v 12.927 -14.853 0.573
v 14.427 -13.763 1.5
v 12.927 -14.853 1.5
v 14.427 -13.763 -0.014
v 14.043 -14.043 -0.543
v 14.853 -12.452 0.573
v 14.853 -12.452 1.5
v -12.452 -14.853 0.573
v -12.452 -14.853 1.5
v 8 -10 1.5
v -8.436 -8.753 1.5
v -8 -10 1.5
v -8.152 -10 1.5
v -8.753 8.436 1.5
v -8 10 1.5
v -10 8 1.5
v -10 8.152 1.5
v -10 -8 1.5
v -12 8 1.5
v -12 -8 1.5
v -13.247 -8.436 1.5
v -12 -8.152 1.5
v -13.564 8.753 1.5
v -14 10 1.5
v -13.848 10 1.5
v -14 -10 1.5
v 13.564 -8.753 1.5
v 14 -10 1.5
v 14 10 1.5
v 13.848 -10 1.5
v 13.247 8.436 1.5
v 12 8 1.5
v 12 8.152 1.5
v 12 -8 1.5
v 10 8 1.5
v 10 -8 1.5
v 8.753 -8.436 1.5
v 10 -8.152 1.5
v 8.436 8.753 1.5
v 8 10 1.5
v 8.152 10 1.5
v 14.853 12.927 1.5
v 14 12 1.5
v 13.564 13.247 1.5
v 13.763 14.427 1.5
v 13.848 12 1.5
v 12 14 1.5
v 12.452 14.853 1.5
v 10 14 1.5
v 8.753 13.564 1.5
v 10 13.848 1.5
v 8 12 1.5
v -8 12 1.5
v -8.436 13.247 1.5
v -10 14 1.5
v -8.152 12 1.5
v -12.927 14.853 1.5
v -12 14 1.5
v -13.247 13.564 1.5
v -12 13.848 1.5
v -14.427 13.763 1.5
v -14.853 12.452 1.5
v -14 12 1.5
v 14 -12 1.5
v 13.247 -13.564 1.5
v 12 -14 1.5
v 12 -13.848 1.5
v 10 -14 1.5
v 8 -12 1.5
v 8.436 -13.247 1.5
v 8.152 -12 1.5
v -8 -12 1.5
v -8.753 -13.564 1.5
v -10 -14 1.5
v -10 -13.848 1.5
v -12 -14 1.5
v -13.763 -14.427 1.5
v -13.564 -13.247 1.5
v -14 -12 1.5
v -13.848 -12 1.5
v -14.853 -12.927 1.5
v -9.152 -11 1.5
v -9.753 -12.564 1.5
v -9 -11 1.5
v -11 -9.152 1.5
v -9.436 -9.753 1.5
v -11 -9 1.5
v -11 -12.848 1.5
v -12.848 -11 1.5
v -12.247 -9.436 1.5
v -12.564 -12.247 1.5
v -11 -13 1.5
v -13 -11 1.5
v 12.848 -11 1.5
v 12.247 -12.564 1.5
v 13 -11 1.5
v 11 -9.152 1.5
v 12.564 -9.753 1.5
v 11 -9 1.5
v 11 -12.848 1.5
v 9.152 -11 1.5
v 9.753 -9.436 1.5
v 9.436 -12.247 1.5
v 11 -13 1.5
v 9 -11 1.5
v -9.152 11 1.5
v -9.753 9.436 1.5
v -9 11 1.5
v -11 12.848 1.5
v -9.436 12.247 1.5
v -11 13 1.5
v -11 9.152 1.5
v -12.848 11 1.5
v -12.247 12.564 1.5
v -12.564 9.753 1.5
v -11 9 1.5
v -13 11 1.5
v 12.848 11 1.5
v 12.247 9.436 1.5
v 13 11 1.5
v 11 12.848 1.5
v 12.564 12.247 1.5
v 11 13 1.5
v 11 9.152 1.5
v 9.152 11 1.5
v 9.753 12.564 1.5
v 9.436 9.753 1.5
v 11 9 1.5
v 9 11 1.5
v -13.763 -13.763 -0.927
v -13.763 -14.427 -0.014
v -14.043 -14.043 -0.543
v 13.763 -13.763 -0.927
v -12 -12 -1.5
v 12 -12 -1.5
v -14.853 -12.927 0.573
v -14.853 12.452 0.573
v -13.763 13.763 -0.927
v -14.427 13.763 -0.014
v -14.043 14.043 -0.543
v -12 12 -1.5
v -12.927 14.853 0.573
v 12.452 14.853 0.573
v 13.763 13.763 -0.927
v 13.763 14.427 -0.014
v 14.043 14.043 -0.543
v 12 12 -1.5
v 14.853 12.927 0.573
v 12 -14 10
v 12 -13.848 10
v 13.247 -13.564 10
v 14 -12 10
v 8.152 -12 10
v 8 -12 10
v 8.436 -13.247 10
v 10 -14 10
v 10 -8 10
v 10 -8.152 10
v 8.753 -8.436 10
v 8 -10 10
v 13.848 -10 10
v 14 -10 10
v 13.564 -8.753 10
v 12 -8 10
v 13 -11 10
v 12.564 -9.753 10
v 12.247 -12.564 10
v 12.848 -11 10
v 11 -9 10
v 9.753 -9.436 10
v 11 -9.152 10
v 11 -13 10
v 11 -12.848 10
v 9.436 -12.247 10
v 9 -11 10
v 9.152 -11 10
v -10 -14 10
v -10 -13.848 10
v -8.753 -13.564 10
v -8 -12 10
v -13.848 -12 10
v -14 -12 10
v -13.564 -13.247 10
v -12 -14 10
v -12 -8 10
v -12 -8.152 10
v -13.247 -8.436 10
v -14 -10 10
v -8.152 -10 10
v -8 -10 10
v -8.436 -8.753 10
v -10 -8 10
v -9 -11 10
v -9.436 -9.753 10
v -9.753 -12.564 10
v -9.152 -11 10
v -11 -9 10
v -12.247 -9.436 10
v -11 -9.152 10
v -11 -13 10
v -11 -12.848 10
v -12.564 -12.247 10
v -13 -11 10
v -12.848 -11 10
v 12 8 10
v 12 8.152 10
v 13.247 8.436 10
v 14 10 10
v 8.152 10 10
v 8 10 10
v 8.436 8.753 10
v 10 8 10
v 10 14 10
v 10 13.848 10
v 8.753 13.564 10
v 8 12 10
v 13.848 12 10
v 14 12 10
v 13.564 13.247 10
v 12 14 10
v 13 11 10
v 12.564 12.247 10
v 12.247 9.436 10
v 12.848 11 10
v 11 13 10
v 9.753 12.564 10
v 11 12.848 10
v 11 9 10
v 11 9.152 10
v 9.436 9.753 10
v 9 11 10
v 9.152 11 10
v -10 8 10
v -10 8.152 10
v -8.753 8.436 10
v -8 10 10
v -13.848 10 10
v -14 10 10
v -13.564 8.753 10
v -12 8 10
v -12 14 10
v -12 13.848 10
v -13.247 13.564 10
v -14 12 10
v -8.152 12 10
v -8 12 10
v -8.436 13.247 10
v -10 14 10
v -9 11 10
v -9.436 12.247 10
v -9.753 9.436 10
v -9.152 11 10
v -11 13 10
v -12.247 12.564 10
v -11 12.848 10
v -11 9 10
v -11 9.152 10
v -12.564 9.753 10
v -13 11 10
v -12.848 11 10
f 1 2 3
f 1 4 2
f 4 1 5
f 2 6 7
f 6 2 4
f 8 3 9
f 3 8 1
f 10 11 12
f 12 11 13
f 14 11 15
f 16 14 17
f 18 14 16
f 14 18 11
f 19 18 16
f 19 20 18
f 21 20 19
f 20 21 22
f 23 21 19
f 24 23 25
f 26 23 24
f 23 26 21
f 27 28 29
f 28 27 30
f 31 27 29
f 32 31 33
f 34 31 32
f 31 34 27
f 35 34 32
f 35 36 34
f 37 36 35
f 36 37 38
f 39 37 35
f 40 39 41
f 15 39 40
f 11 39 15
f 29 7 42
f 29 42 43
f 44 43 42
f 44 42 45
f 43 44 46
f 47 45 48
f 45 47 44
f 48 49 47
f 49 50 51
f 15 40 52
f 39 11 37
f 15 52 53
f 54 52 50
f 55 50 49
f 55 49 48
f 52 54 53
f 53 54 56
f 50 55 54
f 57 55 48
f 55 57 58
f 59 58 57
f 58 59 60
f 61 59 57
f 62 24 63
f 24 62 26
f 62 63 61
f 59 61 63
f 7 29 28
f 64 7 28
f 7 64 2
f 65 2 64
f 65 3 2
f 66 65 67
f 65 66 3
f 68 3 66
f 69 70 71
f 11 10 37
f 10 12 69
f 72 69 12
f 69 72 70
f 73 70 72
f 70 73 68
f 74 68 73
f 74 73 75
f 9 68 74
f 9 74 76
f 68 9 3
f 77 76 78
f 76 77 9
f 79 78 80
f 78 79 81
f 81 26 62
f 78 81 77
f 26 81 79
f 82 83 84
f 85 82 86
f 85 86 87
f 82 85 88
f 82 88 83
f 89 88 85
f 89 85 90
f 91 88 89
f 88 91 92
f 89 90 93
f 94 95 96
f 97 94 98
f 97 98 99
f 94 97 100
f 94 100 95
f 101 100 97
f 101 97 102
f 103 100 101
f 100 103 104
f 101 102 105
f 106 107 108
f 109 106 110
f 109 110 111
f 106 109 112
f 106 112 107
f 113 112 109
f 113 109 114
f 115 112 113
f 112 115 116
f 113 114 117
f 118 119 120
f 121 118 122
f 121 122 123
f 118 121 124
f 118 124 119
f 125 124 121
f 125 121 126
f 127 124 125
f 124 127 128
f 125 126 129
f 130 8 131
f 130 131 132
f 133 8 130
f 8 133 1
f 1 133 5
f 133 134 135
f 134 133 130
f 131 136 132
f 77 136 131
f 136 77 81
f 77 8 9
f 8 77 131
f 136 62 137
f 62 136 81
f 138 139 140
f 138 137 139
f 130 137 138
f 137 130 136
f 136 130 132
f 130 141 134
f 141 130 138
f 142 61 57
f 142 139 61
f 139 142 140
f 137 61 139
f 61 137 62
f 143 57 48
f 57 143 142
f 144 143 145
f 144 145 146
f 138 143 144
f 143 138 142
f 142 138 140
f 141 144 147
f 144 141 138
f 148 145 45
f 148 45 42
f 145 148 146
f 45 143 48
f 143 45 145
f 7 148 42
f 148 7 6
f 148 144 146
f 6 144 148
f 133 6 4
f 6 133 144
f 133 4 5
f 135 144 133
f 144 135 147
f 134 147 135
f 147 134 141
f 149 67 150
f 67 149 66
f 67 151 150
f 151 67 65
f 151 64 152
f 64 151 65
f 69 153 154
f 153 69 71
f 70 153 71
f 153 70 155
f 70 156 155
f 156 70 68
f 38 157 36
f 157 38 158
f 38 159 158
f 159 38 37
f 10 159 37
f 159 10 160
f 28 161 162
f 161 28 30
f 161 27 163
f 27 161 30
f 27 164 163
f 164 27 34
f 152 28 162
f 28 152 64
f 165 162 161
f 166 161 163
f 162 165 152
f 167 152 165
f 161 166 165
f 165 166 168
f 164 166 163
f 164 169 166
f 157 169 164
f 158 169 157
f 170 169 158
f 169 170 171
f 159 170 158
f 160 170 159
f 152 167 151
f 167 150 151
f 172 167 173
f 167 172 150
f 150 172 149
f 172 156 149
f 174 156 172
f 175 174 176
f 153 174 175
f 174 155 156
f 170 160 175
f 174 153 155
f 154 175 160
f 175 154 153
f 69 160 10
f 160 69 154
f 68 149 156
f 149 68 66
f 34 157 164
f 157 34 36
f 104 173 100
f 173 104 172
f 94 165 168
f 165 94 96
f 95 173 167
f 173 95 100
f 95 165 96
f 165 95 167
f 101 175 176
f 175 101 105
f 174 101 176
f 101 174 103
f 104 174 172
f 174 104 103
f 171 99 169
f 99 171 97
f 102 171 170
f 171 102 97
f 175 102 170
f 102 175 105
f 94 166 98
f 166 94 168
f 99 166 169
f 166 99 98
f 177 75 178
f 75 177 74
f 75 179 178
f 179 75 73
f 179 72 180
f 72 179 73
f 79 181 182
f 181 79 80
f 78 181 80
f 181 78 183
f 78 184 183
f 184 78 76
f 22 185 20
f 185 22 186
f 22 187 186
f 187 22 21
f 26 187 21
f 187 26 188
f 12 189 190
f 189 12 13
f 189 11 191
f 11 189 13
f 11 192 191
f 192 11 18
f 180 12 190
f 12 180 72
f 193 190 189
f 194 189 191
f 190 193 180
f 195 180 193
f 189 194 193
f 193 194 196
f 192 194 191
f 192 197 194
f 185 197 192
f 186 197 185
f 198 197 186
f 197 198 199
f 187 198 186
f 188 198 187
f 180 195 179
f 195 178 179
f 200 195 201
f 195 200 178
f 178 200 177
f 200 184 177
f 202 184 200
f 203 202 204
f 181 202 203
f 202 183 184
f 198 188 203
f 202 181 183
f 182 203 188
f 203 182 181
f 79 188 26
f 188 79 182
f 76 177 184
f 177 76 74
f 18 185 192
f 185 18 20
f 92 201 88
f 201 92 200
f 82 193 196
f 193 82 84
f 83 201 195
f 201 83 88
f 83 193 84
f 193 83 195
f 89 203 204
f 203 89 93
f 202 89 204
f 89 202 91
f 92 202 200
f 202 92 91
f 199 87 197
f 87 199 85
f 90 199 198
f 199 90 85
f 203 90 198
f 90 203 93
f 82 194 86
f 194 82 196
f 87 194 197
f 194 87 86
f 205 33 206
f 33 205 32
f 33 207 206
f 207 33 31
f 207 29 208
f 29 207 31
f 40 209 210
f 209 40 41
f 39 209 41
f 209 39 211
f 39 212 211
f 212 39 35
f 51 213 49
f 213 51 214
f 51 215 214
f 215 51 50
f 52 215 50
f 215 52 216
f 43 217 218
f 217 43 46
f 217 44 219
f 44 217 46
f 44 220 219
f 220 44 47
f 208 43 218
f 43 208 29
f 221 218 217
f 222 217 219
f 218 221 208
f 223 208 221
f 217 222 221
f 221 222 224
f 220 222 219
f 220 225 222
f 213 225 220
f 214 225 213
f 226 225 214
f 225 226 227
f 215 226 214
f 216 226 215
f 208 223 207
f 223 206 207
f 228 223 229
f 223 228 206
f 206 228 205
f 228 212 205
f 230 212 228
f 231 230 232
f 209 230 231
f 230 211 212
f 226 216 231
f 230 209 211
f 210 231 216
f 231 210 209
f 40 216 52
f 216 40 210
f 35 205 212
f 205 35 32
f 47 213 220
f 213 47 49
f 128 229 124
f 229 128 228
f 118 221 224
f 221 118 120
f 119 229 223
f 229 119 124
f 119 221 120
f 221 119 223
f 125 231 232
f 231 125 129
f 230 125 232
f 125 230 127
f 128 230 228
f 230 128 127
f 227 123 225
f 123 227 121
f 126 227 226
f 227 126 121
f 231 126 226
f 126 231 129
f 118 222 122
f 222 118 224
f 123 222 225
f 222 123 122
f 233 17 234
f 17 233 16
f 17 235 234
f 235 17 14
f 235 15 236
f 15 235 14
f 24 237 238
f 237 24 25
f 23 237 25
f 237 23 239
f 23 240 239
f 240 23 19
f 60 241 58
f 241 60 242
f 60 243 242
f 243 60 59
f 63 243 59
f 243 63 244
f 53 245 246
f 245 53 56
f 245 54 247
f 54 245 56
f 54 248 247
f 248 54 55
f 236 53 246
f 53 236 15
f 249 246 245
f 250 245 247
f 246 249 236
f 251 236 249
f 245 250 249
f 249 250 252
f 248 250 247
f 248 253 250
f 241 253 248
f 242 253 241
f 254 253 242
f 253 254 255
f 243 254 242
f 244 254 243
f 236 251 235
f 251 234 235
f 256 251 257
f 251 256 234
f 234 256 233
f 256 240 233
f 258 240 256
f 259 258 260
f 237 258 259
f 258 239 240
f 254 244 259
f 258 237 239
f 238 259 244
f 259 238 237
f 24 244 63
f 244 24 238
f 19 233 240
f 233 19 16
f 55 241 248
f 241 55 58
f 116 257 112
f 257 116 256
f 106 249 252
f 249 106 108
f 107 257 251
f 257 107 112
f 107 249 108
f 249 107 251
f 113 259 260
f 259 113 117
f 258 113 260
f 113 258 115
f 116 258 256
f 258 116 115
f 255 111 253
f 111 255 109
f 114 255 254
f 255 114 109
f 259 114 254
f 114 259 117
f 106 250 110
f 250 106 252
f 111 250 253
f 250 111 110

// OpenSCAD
// file: inc/functions.scad
// PRUSA iteration3
// Functions used in many files
// GNU GPL v3
// Josef Průša <josefprusa@me.com>
// Václav 'ax' Hůla <axtheb@gmail.com>
// Vlnofka <>
// http://www.reprap.org/wiki/Prusa_Mendel
// http://github.com/prusajr/PrusaMendel

module roundcorner(diameter){
	difference(){
		cube(size = [diameter,diameter,99], center = false);
		translate(v = [diameter, diameter, 0]) cylinder(h = 100, r=diameter, center=true);
	}
}
module nut(d,h,horizontal=true){
    cornerdiameter =  (d / 2) / cos (180 / 6);
    cylinder(h = h, r = cornerdiameter, $fn = 6);
    if(horizontal){
        for(i = [1:6]){
            rotate([0,0,60*i]) translate([-cornerdiameter-0.2,0,0]) rotate([0,0,-45]) cube([2,2,h]);
        }
    }
}

// Based on nophead research
module polyhole(d, h, center=false) {
    n = max(round(2 * d),3);
    rotate([0,0,180])
        cylinder(h = h, r = (d / 2) / cos (180 / n), $fn = n);
}

// make it interchangeable between this and cylinder
module cylinder_poly(r, h, center=false){
    polyhole(d=r*2, h=h, center=center);
}

module fillet(radius, height=100, $fn=0) {
    //this creates acutal fillet
    translate([-radius, -radius, -height/2-0.01])
        difference() {
            cube([radius*2, radius*2, height+0.02]);
            cylinder(r=radius, h=height+0.02, $fn=$fn);
        }
}

module cube_fillet(size, radius=-1, vertical=[3,3,3,3], top=[0,0,0,0], bottom=[0,0,0,0], center=false, $fn=0){
    //
    if (center) {
        cube_fillet_inside(size, radius, vertical, top, bottom, $fn);
    } else {
        translate([size[0]/2, size[1]/2, size[2]/2])
            cube_fillet_inside(size, radius, vertical, top, bottom, $fn);
    }
}

module cube_negative_fillet(size, radius=-1, vertical=[3,3,3,3], top=[0,0,0,0], bottom=[0,0,0,0], $fn=0){

    j=[1,0,1,0];

    for (i=[0:3]) {
        if (radius > -1) {
            rotate([0, 0, 90*i]) translate([size[1-j[i]]/2, size[j[i]]/2, 0]) fillet(radius, size[2], $fn=$fn);
        } else {
            rotate([0, 0, 90*i]) translate([size[1-j[i]]/2, size[j[i]]/2, 0]) fillet(vertical[i], size[2], $fn=$fn);
        }
        rotate([90*i, -90, 0]) translate([size[2]/2, size[j[i]]/2, 0 ]) fillet(top[i], size[1-j[i]], $fn=$fn);
        rotate([90*(4-i), 90, 0]) translate([size[2]/2, size[j[i]]/2, 0]) fillet(bottom[i], size[1-j[i]], $fn=$fn);

    }
}

module cube_fillet_inside(size, radius=-1, vertical=[3,3,3,3], top=[0,0,0,0], bottom=[0,0,0,0], $fn=0){
    //makes CENTERED cube with round corners
    // if you give it radius, it will fillet vertical corners.
    //othervise use vertical, top, bottom arrays
    //when viewed from top, it starts in upper right corner (+x,+y quadrant) , goes counterclockwise
    //top/bottom fillet starts in direction of Y axis and goes CCW too


    if (radius == 0) {
        cube(size, center=true);
    } else {
        difference() {
            cube(size, center=true);
            cube_negative_fillet(size, radius, vertical, top, bottom, $fn);
        }
    }
}


module nema17(places=[1,1,1,1], size=15.5, h=10, holes=false, shadow=false, $fn=24){
    for (i=[0:3]) {
        if (places[i] == 1) {
            rotate([0, 0, 90*i]) translate([size, size, 0]) {
                if (holes) {
                    #rotate([0, 0, -90*i])  translate([0,0,-10]) screw(r=1.7, slant=false, head_drop=13, $fn=$fn, h=h+12);
                } else {
                    rotate([0, 0, -90*i]) cylinder(h=h, r=5.5, $fn=$fn);
                }
            }
        }
    }
    if (shadow != false) {
        %translate ([0, 0, shadow+21+3]) cube([42,42,42], center = true);
    //flange
        %translate ([0, 0, shadow+21+3-21-1]) cylinder(r=11,h=2, center = true, $fn=20);
    //shaft
        %translate ([0, 0, shadow+21+3-21-7]) cylinder(r=2.5,h=14, center = true);
    }
}

module screw(h=20, r=2, r_head=3.5, head_drop=0, slant=true, poly=false, $fn=0){
    //makes screw with head
    //for substraction as screw hole
    if (poly) {
        cylinder_poly(h=h, r=r, $fn=$fn);
    } else {
        cylinder(h=h, r=r, $fn=$fn);
    }
    if (slant) {
        translate([0, 0, head_drop-0.01]) cylinder(h=r_head, r2=0, r1=r_head, $fn=$fn);
    }

    if (head_drop > 0) {
        translate([0, 0, -0.01]) cylinder(h=head_drop+0.01, r=r_head, $fn=$fn);
    }
}
module screw_cylinder(r_head=5.25,r=3.25,head_drop=6.2,slant=false){
	screw(r_head=r_head,head_drop=head_drop,r=r, slant=slant);

}

//screw_cylinder();
//cube_fillet([10,20,30], vertical=[3,2,0,0], top=[3,2,0,5], bottom=[3,2,0,5]);
//cube_fillet([10,20,30], radius=2, top=[7,2,7,2]);
// file: inc/metric.scad
// PRUSA iteration3
// Default metric sizes
// GNU GPL v3
// Josef Průša <josefprusa@me.com>
// http://www.reprap.org/wiki/Prusa_Mendel
// http://github.com/prusajr/PrusaMendel

// DONT CHANGE THIS FILE! ALTER VALUES IN CONFIGURATION.SCAD INSTEAD

// RODS

threaded_rod_diameter = 8.7;
threaded_rod_diameter_horizontal = 8.7;
smooth_bar_diameter = 8;
smooth_bar_diameter_horizontal = 8.8;

// Nuts and bolts

m8_diameter = 9;
m8_nut_diameter = 14.1;

m4_diameter = 4.5;
m4_nut_diameter = 9;
m4_nut_diameter_horizontal=4.8;

m3_diameter = 3.6;
m3_nut_diameter = 5.3;
m3_nut_diameter_horizontal = 6.1;

// Bushing holder

bushing_core_diameter = smooth_bar_diameter;
bushing_material_thickness = 1;

// Motors

motor_shaft = 5.5;
// file: configuration.scad
// PRUSA iteration3
// Configuration file
// GNU GPL v3
// Josef Průša <josefprusa@me.com>
// Václav 'ax' Hůla <axtheb@gmail.com>
// http://www.reprap.org/wiki/Prusa_Mendel
// http://github.com/prusajr/PrusaMendel

// PLEASE SELECT ONE OF THE CONFIGURATIONS BELOW
// BY UN-COMMENTING IT

// Uncomment for metric settings
// METRIC METRIC METRIC METRIC METRIC METRIC METRIC METRIC 

include <inc/metric.scad>;

// Custom settings here, tailor to your supplies and print settings

// Select your belt type ******************************************************

//T2.5
//belt_tooth_distance = 2.5;
//belt_tooth_ratio = 0.5;

//T5 (strongly discouraged)
belt_tooth_distance = 5;
belt_tooth_ratio = 0.75;

//HTD3
//belt_tooth_distance = 3;
//belt_tooth_ratio = 0.75;

//MXL
//belt_tooth_distance = 2.032;
//belt_tooth_ratio = 0.64;

// Choose bearing/bushing configuration ***************************************

//Choose from:

// 0 = Z as lm[e]8uu, X and Y bushings
// 1 = all bushings
// 2 = all bearings [default. Do not change unless you really know what you are doing]
// DO NOT OFFER 0 or 1 VARIANTS FOR SALE. We really mean that. In the long run it hurts everyone.

bearing_choice = 2;

// Bushing version
// 0 = square igus housings. By igus we mean JFM-0810-10 or GFM-0810-10
// 1 = round igus (works better if printed precisely)
// 2 = bronze self-aligning bushings
bushing_type = 0;

//Bearing version
// 0 = default lm8uu
// 1 = lme8uu
bearing_type = 0;

// Select idler bearing size **************************************************

// 0 = 608 [standard skate bearings]
// 1 = 624 [roughly same diameter as pulley, makes belt parallel so its prettier]

idler_bearing = 0;

// Thickness of the XZ plate board
board_thickness = 12;

//Layer height * width over thickness. Used for idler sleeve
single_wall_width = 0.3*2.2;

// END of custom settings


// You are not supposed to change this
board_to_xz_distance = 26;
xaxis_rod_distance = 45;
carriage_l = 74;
carriage_hole_to_side = 5;
carriage_hole_height = 4;

//calculated from settings

idler_size = (idler_bearing == 0) ? 22 : 13;

//use 4.5 for 608, 2.5 for 624
idler_size_inner_r = (idler_bearing == 0) ? 4.5 : 2.5;

idler_width = (idler_bearing == 0) ? 9 : 5;

// CHANGE ONLY THE STUFF YOU KNOW
// IT WILL REPLACE DEFAULT SETTING

// RODS

// threaded_rod_diameter = 0;
// threaded_rod_diameter_horizontal = 0;
// smooth_bar_diameter = 0;
// smooth_bar_diameter_horizontal = 0;

// Nuts and bolts

// m8_diameter = 0;
// m8_nut_diameter = 0;

// m4_diameter = 0;
// m4_nut_diameter = 0;

// m3_diameter = 0;
// m3_nut_diameter = 0;

// Bushing holder

// bushing_core_diameter = smooth_bar_diameter;
// bushing_material_thickness = 0;

///counted stuff
m3_nut_diameter_bigger = ((m3_nut_diameter  / 2) / cos (180 / 6))*2;

// functions
include <inc/functions.scad>


// These constants define the geometry of the complete-printer.scad

//x_smooth_rod_length=325;
//y_smooth_rod_length=405;
//z_smooth_rod_length=235;
bed_x_size=225;
bed_y_size=225;

x_smooth_rod_length=450+board_thickness*2+10; // 492 for 16mm thickness; 484 for 12mm thickness
y_smooth_rod_length=470;
z_smooth_rod_length=405;  
bed_x_size=225;
bed_y_size=225;
// main file
include <configuration.scad>

rotate([180,0,0])alu_profile_caps();

module alu_profile_caps(){
	cube_fillet([30,30,3], center = true, top=[3,3,3,3],$fn=36);
	difference(){
		translate([11,11,-5])cube_fillet([6,6,10],vertical=[2,2,2,2],center=true,$fn=36);
		translate([11,11,-5])cube_fillet([4,4,10.1],vertical=[2,2,2,2],center=true,$fn=36);
	}

	difference(){
		translate([-11,11,-5])cube_fillet([6,6,10],vertical=[2,2,2,2],center=true,$fn=36);
		translate([-11,11,-5])cube_fillet([4,4,10.1],vertical=[2,2,2,2],center=true,$fn=36);
	}

	difference(){
		translate([11,-11,-5])cube_fillet([6,6,10],vertical=[2,2,2,2],center=true,$fn=36);
		translate([11,-11,-5])cube_fillet([4,4,10.1],vertical=[2,2,2,2],center=true,$fn=36);
	}

	difference(){
		translate([-11,-11,-5])cube_fillet([6,6,10],vertical=[2,2,2,2],center=true,$fn=36);
		translate([-11,-11,-5])cube_fillet([4,4,10.1],vertical=[2,2,2,2],center=true,$fn=36);
	}
	
}
